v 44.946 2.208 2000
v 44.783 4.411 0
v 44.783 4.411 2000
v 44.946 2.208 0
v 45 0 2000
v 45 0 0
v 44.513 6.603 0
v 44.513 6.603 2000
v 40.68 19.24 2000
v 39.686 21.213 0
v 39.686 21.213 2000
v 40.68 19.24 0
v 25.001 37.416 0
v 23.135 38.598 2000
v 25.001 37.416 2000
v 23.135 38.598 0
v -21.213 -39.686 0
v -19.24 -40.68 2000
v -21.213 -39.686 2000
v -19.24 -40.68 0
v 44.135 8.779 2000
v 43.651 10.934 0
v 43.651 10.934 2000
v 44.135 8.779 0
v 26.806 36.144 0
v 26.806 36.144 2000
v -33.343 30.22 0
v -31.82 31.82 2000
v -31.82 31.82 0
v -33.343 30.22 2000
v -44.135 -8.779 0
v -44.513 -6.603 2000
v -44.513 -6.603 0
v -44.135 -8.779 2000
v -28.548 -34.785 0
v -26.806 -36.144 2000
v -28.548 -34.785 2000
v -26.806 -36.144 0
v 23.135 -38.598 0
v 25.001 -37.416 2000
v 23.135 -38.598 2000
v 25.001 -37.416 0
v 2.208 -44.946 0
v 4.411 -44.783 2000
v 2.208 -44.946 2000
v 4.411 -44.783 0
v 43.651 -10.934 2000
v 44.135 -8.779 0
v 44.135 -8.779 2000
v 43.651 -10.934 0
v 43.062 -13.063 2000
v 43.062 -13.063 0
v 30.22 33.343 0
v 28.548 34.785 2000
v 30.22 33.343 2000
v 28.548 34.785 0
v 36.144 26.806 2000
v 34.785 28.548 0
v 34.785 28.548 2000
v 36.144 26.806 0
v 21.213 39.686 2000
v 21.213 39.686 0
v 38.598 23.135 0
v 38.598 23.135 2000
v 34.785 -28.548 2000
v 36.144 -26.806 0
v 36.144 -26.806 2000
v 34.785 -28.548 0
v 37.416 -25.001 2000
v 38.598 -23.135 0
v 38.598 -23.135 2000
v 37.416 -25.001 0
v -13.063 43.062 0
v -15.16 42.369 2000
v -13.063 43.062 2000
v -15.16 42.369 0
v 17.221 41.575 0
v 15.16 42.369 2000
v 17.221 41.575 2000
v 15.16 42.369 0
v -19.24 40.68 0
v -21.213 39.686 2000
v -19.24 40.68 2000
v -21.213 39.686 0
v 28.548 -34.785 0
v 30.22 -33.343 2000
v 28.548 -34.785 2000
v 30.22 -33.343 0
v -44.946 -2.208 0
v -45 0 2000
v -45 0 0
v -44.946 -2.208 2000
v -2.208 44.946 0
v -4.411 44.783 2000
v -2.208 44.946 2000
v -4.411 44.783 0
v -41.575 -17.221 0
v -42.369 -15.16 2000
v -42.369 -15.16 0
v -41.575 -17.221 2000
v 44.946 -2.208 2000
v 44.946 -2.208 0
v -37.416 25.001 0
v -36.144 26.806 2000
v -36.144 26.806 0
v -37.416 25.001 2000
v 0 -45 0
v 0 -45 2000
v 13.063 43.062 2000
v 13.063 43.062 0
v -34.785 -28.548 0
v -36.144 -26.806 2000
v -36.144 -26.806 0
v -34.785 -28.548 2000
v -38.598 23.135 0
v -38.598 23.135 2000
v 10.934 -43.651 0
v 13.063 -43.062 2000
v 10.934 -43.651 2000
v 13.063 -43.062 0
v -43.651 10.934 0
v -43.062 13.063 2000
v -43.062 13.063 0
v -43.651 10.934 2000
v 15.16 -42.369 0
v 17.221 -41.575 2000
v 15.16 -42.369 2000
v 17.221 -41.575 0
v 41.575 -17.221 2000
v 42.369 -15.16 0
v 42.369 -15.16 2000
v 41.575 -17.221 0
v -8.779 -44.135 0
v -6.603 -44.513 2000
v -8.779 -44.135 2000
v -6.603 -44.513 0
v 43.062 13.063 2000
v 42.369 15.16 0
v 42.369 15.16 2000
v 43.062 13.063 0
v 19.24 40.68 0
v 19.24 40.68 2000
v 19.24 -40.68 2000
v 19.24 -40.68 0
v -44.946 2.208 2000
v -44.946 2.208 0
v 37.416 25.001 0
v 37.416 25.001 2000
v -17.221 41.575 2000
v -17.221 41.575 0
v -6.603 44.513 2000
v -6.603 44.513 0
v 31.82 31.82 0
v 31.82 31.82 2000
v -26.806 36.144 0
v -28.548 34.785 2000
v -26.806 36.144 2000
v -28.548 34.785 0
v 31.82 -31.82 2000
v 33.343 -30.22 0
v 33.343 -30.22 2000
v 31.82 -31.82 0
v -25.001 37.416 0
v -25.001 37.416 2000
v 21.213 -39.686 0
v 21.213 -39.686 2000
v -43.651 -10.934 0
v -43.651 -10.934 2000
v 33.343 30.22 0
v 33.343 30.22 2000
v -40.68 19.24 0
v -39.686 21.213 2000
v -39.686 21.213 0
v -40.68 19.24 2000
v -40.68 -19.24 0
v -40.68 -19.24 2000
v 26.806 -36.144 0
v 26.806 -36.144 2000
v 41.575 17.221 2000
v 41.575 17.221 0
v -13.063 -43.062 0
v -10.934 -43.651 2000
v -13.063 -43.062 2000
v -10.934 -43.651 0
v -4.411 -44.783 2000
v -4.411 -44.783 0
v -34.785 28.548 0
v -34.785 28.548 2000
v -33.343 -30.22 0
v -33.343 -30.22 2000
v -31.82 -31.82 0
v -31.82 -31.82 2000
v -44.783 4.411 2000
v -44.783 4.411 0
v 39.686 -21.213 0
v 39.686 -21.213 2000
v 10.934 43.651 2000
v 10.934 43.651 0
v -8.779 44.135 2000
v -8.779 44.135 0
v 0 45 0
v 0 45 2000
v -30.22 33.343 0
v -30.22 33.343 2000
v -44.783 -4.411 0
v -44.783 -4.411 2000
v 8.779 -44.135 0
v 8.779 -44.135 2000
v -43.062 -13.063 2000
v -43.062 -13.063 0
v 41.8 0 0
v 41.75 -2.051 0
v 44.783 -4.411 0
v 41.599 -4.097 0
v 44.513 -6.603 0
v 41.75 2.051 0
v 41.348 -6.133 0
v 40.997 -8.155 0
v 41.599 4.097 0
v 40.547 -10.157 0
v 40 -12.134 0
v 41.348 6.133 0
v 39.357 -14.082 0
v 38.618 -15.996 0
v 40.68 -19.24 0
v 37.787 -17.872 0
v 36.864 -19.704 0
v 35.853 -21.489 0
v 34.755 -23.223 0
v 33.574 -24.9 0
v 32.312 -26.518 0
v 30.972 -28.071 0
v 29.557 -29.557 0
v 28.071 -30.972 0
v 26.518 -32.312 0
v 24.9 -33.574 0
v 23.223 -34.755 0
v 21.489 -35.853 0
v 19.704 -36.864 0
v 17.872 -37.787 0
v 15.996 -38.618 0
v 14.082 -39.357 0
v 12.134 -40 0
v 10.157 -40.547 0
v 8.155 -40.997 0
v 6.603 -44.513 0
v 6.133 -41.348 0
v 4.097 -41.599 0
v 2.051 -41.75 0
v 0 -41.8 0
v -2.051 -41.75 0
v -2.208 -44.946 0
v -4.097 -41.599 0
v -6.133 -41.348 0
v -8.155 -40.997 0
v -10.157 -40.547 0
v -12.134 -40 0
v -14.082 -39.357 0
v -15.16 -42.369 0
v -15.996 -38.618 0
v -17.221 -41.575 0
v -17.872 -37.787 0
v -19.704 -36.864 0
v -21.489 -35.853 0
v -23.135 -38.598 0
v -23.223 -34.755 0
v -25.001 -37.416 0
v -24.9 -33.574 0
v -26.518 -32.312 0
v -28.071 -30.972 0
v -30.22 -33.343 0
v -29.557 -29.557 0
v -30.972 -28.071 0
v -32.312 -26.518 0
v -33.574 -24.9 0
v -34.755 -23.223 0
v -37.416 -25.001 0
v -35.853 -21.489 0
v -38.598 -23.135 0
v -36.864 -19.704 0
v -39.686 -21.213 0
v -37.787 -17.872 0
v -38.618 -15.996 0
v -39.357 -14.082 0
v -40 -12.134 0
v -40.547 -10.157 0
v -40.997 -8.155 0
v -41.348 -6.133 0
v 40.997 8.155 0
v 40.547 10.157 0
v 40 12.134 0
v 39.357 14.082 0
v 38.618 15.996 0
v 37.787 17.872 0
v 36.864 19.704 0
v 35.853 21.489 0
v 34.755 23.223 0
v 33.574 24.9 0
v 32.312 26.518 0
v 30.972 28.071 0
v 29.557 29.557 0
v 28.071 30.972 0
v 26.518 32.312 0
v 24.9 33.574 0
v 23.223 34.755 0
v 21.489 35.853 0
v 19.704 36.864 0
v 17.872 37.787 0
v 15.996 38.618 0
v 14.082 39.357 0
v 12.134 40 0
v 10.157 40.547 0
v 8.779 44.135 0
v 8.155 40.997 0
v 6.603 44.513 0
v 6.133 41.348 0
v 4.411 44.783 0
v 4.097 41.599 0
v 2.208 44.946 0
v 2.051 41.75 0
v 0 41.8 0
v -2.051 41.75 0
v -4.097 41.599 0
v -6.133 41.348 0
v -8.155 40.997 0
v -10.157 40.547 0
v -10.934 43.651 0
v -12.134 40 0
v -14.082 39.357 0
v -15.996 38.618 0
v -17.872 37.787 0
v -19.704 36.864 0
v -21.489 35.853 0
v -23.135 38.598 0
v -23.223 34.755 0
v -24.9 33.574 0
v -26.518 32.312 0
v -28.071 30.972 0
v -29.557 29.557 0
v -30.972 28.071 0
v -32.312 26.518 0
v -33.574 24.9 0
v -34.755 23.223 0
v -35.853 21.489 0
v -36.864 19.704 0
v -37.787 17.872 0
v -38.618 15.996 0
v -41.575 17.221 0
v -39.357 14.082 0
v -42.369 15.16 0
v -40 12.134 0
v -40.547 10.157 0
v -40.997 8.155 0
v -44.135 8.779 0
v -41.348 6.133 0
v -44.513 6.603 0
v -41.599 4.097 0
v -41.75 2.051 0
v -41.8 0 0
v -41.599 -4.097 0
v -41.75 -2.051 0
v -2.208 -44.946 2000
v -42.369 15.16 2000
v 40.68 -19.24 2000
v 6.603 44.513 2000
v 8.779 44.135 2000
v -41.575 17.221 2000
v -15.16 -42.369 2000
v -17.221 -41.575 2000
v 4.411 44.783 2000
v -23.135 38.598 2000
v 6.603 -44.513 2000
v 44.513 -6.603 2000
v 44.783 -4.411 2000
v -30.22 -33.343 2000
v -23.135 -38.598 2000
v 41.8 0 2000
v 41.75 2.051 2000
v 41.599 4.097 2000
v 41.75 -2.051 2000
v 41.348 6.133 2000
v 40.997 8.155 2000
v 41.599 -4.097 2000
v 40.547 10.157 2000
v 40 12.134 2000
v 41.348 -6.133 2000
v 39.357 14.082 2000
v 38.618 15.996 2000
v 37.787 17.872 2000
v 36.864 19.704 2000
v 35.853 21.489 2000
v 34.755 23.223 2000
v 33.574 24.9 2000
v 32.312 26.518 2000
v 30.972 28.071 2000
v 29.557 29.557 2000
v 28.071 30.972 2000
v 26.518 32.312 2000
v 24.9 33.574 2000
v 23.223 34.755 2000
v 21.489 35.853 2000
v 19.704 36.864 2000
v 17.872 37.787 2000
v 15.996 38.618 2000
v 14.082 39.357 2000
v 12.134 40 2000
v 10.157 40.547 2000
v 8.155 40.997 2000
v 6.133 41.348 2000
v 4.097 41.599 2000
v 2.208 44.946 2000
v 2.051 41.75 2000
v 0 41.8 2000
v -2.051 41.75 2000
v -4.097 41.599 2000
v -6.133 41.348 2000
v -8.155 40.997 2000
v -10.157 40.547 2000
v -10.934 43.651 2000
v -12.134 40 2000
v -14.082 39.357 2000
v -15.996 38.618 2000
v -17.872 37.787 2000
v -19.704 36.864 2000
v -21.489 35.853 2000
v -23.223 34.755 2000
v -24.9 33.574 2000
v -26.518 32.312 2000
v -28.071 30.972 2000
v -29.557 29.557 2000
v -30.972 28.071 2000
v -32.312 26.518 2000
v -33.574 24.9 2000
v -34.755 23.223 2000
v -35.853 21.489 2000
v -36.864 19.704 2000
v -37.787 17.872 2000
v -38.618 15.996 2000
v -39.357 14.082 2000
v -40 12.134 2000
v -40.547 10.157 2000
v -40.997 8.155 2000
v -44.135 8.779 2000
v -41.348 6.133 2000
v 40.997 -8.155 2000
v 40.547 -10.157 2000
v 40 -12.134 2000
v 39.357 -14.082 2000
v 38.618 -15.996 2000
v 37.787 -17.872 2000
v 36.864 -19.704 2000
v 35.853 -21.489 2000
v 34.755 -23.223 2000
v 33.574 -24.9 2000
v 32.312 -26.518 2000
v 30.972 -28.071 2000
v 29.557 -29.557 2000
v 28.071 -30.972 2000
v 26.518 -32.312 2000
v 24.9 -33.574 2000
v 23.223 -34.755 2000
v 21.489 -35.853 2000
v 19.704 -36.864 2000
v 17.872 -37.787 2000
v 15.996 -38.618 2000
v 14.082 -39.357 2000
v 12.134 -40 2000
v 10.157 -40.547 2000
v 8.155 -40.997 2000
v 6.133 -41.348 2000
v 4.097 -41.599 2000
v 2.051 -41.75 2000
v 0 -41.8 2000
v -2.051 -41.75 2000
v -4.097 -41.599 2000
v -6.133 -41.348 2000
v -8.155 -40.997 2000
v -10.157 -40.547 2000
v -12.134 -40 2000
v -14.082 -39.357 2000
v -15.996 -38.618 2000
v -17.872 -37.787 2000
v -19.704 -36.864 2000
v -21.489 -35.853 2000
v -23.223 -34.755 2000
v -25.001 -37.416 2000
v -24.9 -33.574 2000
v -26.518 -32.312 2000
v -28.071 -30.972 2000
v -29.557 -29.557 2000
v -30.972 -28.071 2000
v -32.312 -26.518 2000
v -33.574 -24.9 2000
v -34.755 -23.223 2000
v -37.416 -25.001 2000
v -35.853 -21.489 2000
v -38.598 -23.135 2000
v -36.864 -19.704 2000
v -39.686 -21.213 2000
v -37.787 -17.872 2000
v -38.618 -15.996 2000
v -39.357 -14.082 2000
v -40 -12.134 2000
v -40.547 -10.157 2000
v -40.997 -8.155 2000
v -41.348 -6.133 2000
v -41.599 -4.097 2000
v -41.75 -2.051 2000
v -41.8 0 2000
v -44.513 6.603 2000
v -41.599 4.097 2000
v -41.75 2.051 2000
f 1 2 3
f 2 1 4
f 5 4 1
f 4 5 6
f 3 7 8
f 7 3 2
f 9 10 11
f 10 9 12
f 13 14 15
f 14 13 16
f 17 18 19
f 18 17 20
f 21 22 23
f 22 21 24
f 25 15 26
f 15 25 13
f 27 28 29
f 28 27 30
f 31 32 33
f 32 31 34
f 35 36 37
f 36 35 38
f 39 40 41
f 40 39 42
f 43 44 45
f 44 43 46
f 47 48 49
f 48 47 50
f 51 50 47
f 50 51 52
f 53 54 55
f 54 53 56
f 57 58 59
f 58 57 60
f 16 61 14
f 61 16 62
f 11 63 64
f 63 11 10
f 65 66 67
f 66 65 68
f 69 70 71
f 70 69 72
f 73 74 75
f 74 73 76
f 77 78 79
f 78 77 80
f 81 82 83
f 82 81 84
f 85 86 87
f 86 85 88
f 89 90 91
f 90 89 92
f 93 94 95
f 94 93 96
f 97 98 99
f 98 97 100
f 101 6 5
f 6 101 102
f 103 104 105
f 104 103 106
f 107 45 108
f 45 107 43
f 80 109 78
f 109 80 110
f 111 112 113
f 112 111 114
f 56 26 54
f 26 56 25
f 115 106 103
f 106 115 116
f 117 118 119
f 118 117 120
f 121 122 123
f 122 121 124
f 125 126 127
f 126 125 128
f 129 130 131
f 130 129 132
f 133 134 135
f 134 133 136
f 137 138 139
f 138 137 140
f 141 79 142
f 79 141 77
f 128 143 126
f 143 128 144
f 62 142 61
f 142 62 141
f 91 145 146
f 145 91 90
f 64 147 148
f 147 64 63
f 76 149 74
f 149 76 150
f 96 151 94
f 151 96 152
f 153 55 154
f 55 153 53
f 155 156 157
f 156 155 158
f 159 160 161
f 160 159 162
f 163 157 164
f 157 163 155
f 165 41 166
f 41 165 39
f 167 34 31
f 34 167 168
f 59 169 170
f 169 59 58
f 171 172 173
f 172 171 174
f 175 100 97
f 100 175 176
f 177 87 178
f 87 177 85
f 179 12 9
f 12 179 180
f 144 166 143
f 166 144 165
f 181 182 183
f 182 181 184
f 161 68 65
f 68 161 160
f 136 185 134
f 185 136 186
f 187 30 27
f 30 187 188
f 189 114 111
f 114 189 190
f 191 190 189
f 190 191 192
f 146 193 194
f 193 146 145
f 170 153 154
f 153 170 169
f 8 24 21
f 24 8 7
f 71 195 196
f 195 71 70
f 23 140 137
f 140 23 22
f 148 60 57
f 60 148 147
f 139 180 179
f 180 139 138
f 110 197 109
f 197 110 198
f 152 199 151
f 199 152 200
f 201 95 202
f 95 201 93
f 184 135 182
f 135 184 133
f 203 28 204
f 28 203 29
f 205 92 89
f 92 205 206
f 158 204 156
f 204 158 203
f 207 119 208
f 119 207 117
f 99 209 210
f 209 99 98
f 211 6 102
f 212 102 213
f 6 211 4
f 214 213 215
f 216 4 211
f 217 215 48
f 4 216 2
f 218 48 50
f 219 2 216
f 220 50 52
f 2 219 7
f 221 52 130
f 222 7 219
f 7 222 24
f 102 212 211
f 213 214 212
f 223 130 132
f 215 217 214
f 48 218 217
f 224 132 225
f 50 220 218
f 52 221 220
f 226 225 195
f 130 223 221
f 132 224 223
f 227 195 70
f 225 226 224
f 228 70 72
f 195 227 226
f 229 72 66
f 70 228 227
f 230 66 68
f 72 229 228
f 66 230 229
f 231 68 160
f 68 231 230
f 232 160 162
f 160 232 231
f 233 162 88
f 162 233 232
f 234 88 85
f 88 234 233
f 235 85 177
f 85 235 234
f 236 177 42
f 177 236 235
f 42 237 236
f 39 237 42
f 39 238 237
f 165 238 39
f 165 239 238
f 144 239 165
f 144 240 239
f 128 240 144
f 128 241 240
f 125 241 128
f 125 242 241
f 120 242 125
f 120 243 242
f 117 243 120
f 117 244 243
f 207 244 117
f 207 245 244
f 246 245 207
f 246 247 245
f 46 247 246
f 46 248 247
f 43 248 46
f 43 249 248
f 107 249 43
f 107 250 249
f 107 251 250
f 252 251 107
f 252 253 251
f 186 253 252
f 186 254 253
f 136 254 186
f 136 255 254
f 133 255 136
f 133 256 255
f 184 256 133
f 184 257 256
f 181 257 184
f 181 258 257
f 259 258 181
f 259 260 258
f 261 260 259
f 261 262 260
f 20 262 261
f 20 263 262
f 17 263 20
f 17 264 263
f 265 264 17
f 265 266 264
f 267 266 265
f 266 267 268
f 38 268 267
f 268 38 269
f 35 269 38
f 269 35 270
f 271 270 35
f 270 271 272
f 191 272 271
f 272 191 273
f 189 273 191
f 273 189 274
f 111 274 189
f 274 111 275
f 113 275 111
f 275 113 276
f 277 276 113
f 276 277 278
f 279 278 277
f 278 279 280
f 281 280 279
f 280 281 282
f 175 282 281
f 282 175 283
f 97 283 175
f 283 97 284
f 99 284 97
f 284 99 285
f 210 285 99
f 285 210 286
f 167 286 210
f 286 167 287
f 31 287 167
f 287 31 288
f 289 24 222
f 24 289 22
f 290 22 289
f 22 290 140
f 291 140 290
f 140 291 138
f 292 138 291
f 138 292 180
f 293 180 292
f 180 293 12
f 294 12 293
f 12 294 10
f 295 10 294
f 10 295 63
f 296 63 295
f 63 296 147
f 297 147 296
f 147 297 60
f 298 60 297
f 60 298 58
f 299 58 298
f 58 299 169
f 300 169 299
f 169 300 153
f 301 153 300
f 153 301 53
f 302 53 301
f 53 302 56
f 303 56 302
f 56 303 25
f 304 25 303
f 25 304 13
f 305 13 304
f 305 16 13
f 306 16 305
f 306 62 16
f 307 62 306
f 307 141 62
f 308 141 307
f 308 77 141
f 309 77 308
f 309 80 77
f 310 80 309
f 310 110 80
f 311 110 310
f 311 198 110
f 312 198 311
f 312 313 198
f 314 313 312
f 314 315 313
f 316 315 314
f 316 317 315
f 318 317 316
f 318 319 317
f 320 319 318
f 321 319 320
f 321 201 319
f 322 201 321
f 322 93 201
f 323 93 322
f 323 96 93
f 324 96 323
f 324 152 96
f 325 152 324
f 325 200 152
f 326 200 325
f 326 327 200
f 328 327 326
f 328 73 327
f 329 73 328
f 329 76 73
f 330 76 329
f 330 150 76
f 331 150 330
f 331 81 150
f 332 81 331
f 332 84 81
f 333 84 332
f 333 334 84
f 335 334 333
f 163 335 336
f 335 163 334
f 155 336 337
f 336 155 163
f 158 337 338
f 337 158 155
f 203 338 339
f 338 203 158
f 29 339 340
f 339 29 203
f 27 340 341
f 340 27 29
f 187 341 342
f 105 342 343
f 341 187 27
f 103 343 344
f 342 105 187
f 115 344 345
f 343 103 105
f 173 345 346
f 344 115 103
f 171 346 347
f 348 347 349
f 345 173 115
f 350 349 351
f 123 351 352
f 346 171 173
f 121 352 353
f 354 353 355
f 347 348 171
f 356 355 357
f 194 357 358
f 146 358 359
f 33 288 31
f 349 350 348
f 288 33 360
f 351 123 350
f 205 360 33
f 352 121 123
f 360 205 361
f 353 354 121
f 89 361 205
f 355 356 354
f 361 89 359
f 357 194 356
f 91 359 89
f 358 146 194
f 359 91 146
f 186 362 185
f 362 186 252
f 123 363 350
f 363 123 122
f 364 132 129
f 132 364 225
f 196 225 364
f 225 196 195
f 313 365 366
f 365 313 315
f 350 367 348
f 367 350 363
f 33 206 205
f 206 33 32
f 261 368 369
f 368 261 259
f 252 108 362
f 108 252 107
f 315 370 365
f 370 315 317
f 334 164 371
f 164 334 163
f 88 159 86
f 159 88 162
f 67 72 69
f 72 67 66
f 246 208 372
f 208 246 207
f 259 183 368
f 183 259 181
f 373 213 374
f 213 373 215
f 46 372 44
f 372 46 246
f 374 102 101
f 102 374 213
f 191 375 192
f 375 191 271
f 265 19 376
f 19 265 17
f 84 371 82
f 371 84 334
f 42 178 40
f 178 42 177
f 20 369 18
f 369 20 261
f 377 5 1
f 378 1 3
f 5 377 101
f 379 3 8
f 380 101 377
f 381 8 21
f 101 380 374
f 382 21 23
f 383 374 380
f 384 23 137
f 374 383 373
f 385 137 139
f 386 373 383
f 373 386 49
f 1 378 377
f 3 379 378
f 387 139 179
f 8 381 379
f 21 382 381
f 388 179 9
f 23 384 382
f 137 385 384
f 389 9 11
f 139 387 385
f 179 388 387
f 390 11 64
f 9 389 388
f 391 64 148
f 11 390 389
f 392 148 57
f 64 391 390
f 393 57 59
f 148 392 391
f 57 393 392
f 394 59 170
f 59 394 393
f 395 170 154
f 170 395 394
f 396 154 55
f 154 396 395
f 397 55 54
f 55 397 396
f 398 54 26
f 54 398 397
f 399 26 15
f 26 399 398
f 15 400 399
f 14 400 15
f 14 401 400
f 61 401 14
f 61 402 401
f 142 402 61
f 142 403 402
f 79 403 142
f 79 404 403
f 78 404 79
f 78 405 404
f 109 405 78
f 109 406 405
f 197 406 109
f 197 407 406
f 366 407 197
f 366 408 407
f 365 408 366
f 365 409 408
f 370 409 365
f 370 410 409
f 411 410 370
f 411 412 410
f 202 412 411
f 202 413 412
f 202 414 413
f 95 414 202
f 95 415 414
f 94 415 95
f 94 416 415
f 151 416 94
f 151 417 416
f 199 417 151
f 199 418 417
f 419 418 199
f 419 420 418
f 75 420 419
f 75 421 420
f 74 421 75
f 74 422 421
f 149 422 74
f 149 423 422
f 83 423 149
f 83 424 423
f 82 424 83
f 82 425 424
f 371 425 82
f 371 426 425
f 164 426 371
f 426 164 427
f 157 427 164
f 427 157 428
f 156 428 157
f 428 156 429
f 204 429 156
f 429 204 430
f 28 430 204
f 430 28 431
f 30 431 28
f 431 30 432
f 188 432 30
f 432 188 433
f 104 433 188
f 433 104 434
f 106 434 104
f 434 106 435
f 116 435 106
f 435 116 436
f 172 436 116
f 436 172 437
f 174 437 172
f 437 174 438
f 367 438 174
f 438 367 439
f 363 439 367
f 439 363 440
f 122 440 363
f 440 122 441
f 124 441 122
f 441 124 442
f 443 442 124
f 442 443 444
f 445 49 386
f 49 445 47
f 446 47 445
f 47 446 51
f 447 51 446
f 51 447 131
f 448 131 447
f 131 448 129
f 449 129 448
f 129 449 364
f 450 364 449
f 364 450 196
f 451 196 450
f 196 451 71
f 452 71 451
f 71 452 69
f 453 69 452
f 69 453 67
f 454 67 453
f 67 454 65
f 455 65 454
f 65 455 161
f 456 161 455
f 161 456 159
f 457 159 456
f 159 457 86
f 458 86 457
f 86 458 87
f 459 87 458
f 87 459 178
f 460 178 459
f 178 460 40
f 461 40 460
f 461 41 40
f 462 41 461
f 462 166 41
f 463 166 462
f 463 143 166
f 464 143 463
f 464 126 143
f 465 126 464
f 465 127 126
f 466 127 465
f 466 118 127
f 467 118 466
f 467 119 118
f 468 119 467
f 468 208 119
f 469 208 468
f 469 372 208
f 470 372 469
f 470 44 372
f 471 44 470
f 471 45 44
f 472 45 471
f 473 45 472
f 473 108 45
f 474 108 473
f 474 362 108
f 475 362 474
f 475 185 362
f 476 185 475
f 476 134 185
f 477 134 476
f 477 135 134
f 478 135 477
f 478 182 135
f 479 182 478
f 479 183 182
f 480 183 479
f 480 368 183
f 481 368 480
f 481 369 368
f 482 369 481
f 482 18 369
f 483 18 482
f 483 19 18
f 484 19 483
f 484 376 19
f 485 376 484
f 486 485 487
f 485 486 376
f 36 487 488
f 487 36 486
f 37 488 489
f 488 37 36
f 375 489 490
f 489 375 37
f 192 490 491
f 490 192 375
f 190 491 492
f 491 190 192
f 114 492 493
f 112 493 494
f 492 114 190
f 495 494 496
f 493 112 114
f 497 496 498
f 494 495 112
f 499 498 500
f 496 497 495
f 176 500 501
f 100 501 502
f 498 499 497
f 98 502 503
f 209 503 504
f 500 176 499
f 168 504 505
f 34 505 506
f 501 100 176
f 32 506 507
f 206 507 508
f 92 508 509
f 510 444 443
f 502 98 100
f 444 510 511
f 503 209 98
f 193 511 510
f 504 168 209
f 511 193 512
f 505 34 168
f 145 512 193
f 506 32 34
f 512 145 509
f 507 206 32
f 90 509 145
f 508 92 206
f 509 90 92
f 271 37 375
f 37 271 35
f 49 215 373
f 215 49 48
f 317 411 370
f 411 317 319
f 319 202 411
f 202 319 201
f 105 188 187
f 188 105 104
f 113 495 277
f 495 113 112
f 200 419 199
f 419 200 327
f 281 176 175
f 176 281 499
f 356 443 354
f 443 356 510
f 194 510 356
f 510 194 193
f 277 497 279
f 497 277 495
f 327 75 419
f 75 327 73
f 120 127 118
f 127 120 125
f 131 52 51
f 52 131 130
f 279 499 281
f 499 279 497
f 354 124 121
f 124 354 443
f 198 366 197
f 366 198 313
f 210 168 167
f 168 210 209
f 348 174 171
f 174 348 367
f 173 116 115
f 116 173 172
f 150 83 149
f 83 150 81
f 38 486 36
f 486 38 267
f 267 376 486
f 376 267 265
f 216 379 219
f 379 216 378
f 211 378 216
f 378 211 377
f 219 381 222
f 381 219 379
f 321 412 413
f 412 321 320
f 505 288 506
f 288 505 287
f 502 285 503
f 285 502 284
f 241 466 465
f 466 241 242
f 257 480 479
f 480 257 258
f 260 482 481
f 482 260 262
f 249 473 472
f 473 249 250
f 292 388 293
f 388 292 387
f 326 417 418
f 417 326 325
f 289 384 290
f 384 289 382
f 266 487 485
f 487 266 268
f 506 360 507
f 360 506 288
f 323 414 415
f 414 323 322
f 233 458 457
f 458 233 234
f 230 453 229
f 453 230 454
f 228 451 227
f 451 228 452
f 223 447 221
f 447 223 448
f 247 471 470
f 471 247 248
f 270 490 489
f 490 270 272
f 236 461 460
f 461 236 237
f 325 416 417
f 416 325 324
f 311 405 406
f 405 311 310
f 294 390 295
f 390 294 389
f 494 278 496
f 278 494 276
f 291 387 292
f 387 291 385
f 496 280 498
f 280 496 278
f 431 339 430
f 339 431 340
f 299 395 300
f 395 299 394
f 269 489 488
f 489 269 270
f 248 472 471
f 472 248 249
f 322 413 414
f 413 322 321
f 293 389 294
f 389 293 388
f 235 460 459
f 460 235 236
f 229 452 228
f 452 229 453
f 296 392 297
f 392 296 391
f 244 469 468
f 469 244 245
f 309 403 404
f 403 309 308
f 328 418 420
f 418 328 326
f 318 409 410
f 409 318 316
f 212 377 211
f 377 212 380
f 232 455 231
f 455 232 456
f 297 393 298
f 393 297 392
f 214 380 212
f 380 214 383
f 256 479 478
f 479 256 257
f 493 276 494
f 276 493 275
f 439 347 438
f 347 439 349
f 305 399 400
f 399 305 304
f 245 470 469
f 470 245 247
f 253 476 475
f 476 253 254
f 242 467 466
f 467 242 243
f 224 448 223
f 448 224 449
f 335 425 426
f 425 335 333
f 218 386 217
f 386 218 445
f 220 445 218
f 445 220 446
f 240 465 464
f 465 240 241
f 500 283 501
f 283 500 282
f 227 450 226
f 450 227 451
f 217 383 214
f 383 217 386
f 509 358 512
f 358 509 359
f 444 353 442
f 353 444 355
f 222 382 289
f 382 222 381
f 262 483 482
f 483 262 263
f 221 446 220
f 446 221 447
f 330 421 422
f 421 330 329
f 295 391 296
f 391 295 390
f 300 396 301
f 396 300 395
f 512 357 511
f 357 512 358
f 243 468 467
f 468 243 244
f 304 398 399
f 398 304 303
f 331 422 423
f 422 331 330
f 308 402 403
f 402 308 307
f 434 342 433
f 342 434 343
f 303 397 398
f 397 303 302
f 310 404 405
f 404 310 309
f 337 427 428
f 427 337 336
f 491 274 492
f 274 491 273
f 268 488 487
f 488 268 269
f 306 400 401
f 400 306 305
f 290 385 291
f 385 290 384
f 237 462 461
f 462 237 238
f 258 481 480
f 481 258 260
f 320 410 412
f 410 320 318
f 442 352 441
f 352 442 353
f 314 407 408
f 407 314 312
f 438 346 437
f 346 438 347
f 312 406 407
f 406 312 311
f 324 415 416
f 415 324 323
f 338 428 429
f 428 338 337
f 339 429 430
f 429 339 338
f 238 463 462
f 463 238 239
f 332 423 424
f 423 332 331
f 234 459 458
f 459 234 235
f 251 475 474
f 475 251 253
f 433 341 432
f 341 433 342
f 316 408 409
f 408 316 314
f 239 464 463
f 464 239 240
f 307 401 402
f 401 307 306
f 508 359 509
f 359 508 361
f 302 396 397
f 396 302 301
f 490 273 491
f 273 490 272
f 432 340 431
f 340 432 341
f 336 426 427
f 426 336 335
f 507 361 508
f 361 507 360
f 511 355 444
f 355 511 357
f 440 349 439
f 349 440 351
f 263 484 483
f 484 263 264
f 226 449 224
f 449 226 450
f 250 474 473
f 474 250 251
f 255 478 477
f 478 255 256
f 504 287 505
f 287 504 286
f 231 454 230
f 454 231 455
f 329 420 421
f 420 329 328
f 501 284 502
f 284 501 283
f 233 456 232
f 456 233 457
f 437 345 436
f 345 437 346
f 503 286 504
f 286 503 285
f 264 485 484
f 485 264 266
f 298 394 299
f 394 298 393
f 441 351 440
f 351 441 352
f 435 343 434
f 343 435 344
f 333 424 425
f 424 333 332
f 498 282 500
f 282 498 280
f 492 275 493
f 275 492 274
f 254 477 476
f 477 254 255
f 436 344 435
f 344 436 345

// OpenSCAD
$fn = 128;

// HT 90 pipe, length 2000 mm (simple hollow cylinder model)
pipe_outer_d = 90;      // mm
wall_thickness = 3.2;   // mm (typical HT pipe wall; adjust if needed)
pipe_length = 2000;     // mm

outer_r = pipe_outer_d/2;
inner_r = outer_r - wall_thickness;

difference() {
    cylinder(h = pipe_length, r = outer_r, center = false);
    translate([0,0,-0.5])
        cylinder(h = pipe_length + 1, r = inner_r, center = false);
}
